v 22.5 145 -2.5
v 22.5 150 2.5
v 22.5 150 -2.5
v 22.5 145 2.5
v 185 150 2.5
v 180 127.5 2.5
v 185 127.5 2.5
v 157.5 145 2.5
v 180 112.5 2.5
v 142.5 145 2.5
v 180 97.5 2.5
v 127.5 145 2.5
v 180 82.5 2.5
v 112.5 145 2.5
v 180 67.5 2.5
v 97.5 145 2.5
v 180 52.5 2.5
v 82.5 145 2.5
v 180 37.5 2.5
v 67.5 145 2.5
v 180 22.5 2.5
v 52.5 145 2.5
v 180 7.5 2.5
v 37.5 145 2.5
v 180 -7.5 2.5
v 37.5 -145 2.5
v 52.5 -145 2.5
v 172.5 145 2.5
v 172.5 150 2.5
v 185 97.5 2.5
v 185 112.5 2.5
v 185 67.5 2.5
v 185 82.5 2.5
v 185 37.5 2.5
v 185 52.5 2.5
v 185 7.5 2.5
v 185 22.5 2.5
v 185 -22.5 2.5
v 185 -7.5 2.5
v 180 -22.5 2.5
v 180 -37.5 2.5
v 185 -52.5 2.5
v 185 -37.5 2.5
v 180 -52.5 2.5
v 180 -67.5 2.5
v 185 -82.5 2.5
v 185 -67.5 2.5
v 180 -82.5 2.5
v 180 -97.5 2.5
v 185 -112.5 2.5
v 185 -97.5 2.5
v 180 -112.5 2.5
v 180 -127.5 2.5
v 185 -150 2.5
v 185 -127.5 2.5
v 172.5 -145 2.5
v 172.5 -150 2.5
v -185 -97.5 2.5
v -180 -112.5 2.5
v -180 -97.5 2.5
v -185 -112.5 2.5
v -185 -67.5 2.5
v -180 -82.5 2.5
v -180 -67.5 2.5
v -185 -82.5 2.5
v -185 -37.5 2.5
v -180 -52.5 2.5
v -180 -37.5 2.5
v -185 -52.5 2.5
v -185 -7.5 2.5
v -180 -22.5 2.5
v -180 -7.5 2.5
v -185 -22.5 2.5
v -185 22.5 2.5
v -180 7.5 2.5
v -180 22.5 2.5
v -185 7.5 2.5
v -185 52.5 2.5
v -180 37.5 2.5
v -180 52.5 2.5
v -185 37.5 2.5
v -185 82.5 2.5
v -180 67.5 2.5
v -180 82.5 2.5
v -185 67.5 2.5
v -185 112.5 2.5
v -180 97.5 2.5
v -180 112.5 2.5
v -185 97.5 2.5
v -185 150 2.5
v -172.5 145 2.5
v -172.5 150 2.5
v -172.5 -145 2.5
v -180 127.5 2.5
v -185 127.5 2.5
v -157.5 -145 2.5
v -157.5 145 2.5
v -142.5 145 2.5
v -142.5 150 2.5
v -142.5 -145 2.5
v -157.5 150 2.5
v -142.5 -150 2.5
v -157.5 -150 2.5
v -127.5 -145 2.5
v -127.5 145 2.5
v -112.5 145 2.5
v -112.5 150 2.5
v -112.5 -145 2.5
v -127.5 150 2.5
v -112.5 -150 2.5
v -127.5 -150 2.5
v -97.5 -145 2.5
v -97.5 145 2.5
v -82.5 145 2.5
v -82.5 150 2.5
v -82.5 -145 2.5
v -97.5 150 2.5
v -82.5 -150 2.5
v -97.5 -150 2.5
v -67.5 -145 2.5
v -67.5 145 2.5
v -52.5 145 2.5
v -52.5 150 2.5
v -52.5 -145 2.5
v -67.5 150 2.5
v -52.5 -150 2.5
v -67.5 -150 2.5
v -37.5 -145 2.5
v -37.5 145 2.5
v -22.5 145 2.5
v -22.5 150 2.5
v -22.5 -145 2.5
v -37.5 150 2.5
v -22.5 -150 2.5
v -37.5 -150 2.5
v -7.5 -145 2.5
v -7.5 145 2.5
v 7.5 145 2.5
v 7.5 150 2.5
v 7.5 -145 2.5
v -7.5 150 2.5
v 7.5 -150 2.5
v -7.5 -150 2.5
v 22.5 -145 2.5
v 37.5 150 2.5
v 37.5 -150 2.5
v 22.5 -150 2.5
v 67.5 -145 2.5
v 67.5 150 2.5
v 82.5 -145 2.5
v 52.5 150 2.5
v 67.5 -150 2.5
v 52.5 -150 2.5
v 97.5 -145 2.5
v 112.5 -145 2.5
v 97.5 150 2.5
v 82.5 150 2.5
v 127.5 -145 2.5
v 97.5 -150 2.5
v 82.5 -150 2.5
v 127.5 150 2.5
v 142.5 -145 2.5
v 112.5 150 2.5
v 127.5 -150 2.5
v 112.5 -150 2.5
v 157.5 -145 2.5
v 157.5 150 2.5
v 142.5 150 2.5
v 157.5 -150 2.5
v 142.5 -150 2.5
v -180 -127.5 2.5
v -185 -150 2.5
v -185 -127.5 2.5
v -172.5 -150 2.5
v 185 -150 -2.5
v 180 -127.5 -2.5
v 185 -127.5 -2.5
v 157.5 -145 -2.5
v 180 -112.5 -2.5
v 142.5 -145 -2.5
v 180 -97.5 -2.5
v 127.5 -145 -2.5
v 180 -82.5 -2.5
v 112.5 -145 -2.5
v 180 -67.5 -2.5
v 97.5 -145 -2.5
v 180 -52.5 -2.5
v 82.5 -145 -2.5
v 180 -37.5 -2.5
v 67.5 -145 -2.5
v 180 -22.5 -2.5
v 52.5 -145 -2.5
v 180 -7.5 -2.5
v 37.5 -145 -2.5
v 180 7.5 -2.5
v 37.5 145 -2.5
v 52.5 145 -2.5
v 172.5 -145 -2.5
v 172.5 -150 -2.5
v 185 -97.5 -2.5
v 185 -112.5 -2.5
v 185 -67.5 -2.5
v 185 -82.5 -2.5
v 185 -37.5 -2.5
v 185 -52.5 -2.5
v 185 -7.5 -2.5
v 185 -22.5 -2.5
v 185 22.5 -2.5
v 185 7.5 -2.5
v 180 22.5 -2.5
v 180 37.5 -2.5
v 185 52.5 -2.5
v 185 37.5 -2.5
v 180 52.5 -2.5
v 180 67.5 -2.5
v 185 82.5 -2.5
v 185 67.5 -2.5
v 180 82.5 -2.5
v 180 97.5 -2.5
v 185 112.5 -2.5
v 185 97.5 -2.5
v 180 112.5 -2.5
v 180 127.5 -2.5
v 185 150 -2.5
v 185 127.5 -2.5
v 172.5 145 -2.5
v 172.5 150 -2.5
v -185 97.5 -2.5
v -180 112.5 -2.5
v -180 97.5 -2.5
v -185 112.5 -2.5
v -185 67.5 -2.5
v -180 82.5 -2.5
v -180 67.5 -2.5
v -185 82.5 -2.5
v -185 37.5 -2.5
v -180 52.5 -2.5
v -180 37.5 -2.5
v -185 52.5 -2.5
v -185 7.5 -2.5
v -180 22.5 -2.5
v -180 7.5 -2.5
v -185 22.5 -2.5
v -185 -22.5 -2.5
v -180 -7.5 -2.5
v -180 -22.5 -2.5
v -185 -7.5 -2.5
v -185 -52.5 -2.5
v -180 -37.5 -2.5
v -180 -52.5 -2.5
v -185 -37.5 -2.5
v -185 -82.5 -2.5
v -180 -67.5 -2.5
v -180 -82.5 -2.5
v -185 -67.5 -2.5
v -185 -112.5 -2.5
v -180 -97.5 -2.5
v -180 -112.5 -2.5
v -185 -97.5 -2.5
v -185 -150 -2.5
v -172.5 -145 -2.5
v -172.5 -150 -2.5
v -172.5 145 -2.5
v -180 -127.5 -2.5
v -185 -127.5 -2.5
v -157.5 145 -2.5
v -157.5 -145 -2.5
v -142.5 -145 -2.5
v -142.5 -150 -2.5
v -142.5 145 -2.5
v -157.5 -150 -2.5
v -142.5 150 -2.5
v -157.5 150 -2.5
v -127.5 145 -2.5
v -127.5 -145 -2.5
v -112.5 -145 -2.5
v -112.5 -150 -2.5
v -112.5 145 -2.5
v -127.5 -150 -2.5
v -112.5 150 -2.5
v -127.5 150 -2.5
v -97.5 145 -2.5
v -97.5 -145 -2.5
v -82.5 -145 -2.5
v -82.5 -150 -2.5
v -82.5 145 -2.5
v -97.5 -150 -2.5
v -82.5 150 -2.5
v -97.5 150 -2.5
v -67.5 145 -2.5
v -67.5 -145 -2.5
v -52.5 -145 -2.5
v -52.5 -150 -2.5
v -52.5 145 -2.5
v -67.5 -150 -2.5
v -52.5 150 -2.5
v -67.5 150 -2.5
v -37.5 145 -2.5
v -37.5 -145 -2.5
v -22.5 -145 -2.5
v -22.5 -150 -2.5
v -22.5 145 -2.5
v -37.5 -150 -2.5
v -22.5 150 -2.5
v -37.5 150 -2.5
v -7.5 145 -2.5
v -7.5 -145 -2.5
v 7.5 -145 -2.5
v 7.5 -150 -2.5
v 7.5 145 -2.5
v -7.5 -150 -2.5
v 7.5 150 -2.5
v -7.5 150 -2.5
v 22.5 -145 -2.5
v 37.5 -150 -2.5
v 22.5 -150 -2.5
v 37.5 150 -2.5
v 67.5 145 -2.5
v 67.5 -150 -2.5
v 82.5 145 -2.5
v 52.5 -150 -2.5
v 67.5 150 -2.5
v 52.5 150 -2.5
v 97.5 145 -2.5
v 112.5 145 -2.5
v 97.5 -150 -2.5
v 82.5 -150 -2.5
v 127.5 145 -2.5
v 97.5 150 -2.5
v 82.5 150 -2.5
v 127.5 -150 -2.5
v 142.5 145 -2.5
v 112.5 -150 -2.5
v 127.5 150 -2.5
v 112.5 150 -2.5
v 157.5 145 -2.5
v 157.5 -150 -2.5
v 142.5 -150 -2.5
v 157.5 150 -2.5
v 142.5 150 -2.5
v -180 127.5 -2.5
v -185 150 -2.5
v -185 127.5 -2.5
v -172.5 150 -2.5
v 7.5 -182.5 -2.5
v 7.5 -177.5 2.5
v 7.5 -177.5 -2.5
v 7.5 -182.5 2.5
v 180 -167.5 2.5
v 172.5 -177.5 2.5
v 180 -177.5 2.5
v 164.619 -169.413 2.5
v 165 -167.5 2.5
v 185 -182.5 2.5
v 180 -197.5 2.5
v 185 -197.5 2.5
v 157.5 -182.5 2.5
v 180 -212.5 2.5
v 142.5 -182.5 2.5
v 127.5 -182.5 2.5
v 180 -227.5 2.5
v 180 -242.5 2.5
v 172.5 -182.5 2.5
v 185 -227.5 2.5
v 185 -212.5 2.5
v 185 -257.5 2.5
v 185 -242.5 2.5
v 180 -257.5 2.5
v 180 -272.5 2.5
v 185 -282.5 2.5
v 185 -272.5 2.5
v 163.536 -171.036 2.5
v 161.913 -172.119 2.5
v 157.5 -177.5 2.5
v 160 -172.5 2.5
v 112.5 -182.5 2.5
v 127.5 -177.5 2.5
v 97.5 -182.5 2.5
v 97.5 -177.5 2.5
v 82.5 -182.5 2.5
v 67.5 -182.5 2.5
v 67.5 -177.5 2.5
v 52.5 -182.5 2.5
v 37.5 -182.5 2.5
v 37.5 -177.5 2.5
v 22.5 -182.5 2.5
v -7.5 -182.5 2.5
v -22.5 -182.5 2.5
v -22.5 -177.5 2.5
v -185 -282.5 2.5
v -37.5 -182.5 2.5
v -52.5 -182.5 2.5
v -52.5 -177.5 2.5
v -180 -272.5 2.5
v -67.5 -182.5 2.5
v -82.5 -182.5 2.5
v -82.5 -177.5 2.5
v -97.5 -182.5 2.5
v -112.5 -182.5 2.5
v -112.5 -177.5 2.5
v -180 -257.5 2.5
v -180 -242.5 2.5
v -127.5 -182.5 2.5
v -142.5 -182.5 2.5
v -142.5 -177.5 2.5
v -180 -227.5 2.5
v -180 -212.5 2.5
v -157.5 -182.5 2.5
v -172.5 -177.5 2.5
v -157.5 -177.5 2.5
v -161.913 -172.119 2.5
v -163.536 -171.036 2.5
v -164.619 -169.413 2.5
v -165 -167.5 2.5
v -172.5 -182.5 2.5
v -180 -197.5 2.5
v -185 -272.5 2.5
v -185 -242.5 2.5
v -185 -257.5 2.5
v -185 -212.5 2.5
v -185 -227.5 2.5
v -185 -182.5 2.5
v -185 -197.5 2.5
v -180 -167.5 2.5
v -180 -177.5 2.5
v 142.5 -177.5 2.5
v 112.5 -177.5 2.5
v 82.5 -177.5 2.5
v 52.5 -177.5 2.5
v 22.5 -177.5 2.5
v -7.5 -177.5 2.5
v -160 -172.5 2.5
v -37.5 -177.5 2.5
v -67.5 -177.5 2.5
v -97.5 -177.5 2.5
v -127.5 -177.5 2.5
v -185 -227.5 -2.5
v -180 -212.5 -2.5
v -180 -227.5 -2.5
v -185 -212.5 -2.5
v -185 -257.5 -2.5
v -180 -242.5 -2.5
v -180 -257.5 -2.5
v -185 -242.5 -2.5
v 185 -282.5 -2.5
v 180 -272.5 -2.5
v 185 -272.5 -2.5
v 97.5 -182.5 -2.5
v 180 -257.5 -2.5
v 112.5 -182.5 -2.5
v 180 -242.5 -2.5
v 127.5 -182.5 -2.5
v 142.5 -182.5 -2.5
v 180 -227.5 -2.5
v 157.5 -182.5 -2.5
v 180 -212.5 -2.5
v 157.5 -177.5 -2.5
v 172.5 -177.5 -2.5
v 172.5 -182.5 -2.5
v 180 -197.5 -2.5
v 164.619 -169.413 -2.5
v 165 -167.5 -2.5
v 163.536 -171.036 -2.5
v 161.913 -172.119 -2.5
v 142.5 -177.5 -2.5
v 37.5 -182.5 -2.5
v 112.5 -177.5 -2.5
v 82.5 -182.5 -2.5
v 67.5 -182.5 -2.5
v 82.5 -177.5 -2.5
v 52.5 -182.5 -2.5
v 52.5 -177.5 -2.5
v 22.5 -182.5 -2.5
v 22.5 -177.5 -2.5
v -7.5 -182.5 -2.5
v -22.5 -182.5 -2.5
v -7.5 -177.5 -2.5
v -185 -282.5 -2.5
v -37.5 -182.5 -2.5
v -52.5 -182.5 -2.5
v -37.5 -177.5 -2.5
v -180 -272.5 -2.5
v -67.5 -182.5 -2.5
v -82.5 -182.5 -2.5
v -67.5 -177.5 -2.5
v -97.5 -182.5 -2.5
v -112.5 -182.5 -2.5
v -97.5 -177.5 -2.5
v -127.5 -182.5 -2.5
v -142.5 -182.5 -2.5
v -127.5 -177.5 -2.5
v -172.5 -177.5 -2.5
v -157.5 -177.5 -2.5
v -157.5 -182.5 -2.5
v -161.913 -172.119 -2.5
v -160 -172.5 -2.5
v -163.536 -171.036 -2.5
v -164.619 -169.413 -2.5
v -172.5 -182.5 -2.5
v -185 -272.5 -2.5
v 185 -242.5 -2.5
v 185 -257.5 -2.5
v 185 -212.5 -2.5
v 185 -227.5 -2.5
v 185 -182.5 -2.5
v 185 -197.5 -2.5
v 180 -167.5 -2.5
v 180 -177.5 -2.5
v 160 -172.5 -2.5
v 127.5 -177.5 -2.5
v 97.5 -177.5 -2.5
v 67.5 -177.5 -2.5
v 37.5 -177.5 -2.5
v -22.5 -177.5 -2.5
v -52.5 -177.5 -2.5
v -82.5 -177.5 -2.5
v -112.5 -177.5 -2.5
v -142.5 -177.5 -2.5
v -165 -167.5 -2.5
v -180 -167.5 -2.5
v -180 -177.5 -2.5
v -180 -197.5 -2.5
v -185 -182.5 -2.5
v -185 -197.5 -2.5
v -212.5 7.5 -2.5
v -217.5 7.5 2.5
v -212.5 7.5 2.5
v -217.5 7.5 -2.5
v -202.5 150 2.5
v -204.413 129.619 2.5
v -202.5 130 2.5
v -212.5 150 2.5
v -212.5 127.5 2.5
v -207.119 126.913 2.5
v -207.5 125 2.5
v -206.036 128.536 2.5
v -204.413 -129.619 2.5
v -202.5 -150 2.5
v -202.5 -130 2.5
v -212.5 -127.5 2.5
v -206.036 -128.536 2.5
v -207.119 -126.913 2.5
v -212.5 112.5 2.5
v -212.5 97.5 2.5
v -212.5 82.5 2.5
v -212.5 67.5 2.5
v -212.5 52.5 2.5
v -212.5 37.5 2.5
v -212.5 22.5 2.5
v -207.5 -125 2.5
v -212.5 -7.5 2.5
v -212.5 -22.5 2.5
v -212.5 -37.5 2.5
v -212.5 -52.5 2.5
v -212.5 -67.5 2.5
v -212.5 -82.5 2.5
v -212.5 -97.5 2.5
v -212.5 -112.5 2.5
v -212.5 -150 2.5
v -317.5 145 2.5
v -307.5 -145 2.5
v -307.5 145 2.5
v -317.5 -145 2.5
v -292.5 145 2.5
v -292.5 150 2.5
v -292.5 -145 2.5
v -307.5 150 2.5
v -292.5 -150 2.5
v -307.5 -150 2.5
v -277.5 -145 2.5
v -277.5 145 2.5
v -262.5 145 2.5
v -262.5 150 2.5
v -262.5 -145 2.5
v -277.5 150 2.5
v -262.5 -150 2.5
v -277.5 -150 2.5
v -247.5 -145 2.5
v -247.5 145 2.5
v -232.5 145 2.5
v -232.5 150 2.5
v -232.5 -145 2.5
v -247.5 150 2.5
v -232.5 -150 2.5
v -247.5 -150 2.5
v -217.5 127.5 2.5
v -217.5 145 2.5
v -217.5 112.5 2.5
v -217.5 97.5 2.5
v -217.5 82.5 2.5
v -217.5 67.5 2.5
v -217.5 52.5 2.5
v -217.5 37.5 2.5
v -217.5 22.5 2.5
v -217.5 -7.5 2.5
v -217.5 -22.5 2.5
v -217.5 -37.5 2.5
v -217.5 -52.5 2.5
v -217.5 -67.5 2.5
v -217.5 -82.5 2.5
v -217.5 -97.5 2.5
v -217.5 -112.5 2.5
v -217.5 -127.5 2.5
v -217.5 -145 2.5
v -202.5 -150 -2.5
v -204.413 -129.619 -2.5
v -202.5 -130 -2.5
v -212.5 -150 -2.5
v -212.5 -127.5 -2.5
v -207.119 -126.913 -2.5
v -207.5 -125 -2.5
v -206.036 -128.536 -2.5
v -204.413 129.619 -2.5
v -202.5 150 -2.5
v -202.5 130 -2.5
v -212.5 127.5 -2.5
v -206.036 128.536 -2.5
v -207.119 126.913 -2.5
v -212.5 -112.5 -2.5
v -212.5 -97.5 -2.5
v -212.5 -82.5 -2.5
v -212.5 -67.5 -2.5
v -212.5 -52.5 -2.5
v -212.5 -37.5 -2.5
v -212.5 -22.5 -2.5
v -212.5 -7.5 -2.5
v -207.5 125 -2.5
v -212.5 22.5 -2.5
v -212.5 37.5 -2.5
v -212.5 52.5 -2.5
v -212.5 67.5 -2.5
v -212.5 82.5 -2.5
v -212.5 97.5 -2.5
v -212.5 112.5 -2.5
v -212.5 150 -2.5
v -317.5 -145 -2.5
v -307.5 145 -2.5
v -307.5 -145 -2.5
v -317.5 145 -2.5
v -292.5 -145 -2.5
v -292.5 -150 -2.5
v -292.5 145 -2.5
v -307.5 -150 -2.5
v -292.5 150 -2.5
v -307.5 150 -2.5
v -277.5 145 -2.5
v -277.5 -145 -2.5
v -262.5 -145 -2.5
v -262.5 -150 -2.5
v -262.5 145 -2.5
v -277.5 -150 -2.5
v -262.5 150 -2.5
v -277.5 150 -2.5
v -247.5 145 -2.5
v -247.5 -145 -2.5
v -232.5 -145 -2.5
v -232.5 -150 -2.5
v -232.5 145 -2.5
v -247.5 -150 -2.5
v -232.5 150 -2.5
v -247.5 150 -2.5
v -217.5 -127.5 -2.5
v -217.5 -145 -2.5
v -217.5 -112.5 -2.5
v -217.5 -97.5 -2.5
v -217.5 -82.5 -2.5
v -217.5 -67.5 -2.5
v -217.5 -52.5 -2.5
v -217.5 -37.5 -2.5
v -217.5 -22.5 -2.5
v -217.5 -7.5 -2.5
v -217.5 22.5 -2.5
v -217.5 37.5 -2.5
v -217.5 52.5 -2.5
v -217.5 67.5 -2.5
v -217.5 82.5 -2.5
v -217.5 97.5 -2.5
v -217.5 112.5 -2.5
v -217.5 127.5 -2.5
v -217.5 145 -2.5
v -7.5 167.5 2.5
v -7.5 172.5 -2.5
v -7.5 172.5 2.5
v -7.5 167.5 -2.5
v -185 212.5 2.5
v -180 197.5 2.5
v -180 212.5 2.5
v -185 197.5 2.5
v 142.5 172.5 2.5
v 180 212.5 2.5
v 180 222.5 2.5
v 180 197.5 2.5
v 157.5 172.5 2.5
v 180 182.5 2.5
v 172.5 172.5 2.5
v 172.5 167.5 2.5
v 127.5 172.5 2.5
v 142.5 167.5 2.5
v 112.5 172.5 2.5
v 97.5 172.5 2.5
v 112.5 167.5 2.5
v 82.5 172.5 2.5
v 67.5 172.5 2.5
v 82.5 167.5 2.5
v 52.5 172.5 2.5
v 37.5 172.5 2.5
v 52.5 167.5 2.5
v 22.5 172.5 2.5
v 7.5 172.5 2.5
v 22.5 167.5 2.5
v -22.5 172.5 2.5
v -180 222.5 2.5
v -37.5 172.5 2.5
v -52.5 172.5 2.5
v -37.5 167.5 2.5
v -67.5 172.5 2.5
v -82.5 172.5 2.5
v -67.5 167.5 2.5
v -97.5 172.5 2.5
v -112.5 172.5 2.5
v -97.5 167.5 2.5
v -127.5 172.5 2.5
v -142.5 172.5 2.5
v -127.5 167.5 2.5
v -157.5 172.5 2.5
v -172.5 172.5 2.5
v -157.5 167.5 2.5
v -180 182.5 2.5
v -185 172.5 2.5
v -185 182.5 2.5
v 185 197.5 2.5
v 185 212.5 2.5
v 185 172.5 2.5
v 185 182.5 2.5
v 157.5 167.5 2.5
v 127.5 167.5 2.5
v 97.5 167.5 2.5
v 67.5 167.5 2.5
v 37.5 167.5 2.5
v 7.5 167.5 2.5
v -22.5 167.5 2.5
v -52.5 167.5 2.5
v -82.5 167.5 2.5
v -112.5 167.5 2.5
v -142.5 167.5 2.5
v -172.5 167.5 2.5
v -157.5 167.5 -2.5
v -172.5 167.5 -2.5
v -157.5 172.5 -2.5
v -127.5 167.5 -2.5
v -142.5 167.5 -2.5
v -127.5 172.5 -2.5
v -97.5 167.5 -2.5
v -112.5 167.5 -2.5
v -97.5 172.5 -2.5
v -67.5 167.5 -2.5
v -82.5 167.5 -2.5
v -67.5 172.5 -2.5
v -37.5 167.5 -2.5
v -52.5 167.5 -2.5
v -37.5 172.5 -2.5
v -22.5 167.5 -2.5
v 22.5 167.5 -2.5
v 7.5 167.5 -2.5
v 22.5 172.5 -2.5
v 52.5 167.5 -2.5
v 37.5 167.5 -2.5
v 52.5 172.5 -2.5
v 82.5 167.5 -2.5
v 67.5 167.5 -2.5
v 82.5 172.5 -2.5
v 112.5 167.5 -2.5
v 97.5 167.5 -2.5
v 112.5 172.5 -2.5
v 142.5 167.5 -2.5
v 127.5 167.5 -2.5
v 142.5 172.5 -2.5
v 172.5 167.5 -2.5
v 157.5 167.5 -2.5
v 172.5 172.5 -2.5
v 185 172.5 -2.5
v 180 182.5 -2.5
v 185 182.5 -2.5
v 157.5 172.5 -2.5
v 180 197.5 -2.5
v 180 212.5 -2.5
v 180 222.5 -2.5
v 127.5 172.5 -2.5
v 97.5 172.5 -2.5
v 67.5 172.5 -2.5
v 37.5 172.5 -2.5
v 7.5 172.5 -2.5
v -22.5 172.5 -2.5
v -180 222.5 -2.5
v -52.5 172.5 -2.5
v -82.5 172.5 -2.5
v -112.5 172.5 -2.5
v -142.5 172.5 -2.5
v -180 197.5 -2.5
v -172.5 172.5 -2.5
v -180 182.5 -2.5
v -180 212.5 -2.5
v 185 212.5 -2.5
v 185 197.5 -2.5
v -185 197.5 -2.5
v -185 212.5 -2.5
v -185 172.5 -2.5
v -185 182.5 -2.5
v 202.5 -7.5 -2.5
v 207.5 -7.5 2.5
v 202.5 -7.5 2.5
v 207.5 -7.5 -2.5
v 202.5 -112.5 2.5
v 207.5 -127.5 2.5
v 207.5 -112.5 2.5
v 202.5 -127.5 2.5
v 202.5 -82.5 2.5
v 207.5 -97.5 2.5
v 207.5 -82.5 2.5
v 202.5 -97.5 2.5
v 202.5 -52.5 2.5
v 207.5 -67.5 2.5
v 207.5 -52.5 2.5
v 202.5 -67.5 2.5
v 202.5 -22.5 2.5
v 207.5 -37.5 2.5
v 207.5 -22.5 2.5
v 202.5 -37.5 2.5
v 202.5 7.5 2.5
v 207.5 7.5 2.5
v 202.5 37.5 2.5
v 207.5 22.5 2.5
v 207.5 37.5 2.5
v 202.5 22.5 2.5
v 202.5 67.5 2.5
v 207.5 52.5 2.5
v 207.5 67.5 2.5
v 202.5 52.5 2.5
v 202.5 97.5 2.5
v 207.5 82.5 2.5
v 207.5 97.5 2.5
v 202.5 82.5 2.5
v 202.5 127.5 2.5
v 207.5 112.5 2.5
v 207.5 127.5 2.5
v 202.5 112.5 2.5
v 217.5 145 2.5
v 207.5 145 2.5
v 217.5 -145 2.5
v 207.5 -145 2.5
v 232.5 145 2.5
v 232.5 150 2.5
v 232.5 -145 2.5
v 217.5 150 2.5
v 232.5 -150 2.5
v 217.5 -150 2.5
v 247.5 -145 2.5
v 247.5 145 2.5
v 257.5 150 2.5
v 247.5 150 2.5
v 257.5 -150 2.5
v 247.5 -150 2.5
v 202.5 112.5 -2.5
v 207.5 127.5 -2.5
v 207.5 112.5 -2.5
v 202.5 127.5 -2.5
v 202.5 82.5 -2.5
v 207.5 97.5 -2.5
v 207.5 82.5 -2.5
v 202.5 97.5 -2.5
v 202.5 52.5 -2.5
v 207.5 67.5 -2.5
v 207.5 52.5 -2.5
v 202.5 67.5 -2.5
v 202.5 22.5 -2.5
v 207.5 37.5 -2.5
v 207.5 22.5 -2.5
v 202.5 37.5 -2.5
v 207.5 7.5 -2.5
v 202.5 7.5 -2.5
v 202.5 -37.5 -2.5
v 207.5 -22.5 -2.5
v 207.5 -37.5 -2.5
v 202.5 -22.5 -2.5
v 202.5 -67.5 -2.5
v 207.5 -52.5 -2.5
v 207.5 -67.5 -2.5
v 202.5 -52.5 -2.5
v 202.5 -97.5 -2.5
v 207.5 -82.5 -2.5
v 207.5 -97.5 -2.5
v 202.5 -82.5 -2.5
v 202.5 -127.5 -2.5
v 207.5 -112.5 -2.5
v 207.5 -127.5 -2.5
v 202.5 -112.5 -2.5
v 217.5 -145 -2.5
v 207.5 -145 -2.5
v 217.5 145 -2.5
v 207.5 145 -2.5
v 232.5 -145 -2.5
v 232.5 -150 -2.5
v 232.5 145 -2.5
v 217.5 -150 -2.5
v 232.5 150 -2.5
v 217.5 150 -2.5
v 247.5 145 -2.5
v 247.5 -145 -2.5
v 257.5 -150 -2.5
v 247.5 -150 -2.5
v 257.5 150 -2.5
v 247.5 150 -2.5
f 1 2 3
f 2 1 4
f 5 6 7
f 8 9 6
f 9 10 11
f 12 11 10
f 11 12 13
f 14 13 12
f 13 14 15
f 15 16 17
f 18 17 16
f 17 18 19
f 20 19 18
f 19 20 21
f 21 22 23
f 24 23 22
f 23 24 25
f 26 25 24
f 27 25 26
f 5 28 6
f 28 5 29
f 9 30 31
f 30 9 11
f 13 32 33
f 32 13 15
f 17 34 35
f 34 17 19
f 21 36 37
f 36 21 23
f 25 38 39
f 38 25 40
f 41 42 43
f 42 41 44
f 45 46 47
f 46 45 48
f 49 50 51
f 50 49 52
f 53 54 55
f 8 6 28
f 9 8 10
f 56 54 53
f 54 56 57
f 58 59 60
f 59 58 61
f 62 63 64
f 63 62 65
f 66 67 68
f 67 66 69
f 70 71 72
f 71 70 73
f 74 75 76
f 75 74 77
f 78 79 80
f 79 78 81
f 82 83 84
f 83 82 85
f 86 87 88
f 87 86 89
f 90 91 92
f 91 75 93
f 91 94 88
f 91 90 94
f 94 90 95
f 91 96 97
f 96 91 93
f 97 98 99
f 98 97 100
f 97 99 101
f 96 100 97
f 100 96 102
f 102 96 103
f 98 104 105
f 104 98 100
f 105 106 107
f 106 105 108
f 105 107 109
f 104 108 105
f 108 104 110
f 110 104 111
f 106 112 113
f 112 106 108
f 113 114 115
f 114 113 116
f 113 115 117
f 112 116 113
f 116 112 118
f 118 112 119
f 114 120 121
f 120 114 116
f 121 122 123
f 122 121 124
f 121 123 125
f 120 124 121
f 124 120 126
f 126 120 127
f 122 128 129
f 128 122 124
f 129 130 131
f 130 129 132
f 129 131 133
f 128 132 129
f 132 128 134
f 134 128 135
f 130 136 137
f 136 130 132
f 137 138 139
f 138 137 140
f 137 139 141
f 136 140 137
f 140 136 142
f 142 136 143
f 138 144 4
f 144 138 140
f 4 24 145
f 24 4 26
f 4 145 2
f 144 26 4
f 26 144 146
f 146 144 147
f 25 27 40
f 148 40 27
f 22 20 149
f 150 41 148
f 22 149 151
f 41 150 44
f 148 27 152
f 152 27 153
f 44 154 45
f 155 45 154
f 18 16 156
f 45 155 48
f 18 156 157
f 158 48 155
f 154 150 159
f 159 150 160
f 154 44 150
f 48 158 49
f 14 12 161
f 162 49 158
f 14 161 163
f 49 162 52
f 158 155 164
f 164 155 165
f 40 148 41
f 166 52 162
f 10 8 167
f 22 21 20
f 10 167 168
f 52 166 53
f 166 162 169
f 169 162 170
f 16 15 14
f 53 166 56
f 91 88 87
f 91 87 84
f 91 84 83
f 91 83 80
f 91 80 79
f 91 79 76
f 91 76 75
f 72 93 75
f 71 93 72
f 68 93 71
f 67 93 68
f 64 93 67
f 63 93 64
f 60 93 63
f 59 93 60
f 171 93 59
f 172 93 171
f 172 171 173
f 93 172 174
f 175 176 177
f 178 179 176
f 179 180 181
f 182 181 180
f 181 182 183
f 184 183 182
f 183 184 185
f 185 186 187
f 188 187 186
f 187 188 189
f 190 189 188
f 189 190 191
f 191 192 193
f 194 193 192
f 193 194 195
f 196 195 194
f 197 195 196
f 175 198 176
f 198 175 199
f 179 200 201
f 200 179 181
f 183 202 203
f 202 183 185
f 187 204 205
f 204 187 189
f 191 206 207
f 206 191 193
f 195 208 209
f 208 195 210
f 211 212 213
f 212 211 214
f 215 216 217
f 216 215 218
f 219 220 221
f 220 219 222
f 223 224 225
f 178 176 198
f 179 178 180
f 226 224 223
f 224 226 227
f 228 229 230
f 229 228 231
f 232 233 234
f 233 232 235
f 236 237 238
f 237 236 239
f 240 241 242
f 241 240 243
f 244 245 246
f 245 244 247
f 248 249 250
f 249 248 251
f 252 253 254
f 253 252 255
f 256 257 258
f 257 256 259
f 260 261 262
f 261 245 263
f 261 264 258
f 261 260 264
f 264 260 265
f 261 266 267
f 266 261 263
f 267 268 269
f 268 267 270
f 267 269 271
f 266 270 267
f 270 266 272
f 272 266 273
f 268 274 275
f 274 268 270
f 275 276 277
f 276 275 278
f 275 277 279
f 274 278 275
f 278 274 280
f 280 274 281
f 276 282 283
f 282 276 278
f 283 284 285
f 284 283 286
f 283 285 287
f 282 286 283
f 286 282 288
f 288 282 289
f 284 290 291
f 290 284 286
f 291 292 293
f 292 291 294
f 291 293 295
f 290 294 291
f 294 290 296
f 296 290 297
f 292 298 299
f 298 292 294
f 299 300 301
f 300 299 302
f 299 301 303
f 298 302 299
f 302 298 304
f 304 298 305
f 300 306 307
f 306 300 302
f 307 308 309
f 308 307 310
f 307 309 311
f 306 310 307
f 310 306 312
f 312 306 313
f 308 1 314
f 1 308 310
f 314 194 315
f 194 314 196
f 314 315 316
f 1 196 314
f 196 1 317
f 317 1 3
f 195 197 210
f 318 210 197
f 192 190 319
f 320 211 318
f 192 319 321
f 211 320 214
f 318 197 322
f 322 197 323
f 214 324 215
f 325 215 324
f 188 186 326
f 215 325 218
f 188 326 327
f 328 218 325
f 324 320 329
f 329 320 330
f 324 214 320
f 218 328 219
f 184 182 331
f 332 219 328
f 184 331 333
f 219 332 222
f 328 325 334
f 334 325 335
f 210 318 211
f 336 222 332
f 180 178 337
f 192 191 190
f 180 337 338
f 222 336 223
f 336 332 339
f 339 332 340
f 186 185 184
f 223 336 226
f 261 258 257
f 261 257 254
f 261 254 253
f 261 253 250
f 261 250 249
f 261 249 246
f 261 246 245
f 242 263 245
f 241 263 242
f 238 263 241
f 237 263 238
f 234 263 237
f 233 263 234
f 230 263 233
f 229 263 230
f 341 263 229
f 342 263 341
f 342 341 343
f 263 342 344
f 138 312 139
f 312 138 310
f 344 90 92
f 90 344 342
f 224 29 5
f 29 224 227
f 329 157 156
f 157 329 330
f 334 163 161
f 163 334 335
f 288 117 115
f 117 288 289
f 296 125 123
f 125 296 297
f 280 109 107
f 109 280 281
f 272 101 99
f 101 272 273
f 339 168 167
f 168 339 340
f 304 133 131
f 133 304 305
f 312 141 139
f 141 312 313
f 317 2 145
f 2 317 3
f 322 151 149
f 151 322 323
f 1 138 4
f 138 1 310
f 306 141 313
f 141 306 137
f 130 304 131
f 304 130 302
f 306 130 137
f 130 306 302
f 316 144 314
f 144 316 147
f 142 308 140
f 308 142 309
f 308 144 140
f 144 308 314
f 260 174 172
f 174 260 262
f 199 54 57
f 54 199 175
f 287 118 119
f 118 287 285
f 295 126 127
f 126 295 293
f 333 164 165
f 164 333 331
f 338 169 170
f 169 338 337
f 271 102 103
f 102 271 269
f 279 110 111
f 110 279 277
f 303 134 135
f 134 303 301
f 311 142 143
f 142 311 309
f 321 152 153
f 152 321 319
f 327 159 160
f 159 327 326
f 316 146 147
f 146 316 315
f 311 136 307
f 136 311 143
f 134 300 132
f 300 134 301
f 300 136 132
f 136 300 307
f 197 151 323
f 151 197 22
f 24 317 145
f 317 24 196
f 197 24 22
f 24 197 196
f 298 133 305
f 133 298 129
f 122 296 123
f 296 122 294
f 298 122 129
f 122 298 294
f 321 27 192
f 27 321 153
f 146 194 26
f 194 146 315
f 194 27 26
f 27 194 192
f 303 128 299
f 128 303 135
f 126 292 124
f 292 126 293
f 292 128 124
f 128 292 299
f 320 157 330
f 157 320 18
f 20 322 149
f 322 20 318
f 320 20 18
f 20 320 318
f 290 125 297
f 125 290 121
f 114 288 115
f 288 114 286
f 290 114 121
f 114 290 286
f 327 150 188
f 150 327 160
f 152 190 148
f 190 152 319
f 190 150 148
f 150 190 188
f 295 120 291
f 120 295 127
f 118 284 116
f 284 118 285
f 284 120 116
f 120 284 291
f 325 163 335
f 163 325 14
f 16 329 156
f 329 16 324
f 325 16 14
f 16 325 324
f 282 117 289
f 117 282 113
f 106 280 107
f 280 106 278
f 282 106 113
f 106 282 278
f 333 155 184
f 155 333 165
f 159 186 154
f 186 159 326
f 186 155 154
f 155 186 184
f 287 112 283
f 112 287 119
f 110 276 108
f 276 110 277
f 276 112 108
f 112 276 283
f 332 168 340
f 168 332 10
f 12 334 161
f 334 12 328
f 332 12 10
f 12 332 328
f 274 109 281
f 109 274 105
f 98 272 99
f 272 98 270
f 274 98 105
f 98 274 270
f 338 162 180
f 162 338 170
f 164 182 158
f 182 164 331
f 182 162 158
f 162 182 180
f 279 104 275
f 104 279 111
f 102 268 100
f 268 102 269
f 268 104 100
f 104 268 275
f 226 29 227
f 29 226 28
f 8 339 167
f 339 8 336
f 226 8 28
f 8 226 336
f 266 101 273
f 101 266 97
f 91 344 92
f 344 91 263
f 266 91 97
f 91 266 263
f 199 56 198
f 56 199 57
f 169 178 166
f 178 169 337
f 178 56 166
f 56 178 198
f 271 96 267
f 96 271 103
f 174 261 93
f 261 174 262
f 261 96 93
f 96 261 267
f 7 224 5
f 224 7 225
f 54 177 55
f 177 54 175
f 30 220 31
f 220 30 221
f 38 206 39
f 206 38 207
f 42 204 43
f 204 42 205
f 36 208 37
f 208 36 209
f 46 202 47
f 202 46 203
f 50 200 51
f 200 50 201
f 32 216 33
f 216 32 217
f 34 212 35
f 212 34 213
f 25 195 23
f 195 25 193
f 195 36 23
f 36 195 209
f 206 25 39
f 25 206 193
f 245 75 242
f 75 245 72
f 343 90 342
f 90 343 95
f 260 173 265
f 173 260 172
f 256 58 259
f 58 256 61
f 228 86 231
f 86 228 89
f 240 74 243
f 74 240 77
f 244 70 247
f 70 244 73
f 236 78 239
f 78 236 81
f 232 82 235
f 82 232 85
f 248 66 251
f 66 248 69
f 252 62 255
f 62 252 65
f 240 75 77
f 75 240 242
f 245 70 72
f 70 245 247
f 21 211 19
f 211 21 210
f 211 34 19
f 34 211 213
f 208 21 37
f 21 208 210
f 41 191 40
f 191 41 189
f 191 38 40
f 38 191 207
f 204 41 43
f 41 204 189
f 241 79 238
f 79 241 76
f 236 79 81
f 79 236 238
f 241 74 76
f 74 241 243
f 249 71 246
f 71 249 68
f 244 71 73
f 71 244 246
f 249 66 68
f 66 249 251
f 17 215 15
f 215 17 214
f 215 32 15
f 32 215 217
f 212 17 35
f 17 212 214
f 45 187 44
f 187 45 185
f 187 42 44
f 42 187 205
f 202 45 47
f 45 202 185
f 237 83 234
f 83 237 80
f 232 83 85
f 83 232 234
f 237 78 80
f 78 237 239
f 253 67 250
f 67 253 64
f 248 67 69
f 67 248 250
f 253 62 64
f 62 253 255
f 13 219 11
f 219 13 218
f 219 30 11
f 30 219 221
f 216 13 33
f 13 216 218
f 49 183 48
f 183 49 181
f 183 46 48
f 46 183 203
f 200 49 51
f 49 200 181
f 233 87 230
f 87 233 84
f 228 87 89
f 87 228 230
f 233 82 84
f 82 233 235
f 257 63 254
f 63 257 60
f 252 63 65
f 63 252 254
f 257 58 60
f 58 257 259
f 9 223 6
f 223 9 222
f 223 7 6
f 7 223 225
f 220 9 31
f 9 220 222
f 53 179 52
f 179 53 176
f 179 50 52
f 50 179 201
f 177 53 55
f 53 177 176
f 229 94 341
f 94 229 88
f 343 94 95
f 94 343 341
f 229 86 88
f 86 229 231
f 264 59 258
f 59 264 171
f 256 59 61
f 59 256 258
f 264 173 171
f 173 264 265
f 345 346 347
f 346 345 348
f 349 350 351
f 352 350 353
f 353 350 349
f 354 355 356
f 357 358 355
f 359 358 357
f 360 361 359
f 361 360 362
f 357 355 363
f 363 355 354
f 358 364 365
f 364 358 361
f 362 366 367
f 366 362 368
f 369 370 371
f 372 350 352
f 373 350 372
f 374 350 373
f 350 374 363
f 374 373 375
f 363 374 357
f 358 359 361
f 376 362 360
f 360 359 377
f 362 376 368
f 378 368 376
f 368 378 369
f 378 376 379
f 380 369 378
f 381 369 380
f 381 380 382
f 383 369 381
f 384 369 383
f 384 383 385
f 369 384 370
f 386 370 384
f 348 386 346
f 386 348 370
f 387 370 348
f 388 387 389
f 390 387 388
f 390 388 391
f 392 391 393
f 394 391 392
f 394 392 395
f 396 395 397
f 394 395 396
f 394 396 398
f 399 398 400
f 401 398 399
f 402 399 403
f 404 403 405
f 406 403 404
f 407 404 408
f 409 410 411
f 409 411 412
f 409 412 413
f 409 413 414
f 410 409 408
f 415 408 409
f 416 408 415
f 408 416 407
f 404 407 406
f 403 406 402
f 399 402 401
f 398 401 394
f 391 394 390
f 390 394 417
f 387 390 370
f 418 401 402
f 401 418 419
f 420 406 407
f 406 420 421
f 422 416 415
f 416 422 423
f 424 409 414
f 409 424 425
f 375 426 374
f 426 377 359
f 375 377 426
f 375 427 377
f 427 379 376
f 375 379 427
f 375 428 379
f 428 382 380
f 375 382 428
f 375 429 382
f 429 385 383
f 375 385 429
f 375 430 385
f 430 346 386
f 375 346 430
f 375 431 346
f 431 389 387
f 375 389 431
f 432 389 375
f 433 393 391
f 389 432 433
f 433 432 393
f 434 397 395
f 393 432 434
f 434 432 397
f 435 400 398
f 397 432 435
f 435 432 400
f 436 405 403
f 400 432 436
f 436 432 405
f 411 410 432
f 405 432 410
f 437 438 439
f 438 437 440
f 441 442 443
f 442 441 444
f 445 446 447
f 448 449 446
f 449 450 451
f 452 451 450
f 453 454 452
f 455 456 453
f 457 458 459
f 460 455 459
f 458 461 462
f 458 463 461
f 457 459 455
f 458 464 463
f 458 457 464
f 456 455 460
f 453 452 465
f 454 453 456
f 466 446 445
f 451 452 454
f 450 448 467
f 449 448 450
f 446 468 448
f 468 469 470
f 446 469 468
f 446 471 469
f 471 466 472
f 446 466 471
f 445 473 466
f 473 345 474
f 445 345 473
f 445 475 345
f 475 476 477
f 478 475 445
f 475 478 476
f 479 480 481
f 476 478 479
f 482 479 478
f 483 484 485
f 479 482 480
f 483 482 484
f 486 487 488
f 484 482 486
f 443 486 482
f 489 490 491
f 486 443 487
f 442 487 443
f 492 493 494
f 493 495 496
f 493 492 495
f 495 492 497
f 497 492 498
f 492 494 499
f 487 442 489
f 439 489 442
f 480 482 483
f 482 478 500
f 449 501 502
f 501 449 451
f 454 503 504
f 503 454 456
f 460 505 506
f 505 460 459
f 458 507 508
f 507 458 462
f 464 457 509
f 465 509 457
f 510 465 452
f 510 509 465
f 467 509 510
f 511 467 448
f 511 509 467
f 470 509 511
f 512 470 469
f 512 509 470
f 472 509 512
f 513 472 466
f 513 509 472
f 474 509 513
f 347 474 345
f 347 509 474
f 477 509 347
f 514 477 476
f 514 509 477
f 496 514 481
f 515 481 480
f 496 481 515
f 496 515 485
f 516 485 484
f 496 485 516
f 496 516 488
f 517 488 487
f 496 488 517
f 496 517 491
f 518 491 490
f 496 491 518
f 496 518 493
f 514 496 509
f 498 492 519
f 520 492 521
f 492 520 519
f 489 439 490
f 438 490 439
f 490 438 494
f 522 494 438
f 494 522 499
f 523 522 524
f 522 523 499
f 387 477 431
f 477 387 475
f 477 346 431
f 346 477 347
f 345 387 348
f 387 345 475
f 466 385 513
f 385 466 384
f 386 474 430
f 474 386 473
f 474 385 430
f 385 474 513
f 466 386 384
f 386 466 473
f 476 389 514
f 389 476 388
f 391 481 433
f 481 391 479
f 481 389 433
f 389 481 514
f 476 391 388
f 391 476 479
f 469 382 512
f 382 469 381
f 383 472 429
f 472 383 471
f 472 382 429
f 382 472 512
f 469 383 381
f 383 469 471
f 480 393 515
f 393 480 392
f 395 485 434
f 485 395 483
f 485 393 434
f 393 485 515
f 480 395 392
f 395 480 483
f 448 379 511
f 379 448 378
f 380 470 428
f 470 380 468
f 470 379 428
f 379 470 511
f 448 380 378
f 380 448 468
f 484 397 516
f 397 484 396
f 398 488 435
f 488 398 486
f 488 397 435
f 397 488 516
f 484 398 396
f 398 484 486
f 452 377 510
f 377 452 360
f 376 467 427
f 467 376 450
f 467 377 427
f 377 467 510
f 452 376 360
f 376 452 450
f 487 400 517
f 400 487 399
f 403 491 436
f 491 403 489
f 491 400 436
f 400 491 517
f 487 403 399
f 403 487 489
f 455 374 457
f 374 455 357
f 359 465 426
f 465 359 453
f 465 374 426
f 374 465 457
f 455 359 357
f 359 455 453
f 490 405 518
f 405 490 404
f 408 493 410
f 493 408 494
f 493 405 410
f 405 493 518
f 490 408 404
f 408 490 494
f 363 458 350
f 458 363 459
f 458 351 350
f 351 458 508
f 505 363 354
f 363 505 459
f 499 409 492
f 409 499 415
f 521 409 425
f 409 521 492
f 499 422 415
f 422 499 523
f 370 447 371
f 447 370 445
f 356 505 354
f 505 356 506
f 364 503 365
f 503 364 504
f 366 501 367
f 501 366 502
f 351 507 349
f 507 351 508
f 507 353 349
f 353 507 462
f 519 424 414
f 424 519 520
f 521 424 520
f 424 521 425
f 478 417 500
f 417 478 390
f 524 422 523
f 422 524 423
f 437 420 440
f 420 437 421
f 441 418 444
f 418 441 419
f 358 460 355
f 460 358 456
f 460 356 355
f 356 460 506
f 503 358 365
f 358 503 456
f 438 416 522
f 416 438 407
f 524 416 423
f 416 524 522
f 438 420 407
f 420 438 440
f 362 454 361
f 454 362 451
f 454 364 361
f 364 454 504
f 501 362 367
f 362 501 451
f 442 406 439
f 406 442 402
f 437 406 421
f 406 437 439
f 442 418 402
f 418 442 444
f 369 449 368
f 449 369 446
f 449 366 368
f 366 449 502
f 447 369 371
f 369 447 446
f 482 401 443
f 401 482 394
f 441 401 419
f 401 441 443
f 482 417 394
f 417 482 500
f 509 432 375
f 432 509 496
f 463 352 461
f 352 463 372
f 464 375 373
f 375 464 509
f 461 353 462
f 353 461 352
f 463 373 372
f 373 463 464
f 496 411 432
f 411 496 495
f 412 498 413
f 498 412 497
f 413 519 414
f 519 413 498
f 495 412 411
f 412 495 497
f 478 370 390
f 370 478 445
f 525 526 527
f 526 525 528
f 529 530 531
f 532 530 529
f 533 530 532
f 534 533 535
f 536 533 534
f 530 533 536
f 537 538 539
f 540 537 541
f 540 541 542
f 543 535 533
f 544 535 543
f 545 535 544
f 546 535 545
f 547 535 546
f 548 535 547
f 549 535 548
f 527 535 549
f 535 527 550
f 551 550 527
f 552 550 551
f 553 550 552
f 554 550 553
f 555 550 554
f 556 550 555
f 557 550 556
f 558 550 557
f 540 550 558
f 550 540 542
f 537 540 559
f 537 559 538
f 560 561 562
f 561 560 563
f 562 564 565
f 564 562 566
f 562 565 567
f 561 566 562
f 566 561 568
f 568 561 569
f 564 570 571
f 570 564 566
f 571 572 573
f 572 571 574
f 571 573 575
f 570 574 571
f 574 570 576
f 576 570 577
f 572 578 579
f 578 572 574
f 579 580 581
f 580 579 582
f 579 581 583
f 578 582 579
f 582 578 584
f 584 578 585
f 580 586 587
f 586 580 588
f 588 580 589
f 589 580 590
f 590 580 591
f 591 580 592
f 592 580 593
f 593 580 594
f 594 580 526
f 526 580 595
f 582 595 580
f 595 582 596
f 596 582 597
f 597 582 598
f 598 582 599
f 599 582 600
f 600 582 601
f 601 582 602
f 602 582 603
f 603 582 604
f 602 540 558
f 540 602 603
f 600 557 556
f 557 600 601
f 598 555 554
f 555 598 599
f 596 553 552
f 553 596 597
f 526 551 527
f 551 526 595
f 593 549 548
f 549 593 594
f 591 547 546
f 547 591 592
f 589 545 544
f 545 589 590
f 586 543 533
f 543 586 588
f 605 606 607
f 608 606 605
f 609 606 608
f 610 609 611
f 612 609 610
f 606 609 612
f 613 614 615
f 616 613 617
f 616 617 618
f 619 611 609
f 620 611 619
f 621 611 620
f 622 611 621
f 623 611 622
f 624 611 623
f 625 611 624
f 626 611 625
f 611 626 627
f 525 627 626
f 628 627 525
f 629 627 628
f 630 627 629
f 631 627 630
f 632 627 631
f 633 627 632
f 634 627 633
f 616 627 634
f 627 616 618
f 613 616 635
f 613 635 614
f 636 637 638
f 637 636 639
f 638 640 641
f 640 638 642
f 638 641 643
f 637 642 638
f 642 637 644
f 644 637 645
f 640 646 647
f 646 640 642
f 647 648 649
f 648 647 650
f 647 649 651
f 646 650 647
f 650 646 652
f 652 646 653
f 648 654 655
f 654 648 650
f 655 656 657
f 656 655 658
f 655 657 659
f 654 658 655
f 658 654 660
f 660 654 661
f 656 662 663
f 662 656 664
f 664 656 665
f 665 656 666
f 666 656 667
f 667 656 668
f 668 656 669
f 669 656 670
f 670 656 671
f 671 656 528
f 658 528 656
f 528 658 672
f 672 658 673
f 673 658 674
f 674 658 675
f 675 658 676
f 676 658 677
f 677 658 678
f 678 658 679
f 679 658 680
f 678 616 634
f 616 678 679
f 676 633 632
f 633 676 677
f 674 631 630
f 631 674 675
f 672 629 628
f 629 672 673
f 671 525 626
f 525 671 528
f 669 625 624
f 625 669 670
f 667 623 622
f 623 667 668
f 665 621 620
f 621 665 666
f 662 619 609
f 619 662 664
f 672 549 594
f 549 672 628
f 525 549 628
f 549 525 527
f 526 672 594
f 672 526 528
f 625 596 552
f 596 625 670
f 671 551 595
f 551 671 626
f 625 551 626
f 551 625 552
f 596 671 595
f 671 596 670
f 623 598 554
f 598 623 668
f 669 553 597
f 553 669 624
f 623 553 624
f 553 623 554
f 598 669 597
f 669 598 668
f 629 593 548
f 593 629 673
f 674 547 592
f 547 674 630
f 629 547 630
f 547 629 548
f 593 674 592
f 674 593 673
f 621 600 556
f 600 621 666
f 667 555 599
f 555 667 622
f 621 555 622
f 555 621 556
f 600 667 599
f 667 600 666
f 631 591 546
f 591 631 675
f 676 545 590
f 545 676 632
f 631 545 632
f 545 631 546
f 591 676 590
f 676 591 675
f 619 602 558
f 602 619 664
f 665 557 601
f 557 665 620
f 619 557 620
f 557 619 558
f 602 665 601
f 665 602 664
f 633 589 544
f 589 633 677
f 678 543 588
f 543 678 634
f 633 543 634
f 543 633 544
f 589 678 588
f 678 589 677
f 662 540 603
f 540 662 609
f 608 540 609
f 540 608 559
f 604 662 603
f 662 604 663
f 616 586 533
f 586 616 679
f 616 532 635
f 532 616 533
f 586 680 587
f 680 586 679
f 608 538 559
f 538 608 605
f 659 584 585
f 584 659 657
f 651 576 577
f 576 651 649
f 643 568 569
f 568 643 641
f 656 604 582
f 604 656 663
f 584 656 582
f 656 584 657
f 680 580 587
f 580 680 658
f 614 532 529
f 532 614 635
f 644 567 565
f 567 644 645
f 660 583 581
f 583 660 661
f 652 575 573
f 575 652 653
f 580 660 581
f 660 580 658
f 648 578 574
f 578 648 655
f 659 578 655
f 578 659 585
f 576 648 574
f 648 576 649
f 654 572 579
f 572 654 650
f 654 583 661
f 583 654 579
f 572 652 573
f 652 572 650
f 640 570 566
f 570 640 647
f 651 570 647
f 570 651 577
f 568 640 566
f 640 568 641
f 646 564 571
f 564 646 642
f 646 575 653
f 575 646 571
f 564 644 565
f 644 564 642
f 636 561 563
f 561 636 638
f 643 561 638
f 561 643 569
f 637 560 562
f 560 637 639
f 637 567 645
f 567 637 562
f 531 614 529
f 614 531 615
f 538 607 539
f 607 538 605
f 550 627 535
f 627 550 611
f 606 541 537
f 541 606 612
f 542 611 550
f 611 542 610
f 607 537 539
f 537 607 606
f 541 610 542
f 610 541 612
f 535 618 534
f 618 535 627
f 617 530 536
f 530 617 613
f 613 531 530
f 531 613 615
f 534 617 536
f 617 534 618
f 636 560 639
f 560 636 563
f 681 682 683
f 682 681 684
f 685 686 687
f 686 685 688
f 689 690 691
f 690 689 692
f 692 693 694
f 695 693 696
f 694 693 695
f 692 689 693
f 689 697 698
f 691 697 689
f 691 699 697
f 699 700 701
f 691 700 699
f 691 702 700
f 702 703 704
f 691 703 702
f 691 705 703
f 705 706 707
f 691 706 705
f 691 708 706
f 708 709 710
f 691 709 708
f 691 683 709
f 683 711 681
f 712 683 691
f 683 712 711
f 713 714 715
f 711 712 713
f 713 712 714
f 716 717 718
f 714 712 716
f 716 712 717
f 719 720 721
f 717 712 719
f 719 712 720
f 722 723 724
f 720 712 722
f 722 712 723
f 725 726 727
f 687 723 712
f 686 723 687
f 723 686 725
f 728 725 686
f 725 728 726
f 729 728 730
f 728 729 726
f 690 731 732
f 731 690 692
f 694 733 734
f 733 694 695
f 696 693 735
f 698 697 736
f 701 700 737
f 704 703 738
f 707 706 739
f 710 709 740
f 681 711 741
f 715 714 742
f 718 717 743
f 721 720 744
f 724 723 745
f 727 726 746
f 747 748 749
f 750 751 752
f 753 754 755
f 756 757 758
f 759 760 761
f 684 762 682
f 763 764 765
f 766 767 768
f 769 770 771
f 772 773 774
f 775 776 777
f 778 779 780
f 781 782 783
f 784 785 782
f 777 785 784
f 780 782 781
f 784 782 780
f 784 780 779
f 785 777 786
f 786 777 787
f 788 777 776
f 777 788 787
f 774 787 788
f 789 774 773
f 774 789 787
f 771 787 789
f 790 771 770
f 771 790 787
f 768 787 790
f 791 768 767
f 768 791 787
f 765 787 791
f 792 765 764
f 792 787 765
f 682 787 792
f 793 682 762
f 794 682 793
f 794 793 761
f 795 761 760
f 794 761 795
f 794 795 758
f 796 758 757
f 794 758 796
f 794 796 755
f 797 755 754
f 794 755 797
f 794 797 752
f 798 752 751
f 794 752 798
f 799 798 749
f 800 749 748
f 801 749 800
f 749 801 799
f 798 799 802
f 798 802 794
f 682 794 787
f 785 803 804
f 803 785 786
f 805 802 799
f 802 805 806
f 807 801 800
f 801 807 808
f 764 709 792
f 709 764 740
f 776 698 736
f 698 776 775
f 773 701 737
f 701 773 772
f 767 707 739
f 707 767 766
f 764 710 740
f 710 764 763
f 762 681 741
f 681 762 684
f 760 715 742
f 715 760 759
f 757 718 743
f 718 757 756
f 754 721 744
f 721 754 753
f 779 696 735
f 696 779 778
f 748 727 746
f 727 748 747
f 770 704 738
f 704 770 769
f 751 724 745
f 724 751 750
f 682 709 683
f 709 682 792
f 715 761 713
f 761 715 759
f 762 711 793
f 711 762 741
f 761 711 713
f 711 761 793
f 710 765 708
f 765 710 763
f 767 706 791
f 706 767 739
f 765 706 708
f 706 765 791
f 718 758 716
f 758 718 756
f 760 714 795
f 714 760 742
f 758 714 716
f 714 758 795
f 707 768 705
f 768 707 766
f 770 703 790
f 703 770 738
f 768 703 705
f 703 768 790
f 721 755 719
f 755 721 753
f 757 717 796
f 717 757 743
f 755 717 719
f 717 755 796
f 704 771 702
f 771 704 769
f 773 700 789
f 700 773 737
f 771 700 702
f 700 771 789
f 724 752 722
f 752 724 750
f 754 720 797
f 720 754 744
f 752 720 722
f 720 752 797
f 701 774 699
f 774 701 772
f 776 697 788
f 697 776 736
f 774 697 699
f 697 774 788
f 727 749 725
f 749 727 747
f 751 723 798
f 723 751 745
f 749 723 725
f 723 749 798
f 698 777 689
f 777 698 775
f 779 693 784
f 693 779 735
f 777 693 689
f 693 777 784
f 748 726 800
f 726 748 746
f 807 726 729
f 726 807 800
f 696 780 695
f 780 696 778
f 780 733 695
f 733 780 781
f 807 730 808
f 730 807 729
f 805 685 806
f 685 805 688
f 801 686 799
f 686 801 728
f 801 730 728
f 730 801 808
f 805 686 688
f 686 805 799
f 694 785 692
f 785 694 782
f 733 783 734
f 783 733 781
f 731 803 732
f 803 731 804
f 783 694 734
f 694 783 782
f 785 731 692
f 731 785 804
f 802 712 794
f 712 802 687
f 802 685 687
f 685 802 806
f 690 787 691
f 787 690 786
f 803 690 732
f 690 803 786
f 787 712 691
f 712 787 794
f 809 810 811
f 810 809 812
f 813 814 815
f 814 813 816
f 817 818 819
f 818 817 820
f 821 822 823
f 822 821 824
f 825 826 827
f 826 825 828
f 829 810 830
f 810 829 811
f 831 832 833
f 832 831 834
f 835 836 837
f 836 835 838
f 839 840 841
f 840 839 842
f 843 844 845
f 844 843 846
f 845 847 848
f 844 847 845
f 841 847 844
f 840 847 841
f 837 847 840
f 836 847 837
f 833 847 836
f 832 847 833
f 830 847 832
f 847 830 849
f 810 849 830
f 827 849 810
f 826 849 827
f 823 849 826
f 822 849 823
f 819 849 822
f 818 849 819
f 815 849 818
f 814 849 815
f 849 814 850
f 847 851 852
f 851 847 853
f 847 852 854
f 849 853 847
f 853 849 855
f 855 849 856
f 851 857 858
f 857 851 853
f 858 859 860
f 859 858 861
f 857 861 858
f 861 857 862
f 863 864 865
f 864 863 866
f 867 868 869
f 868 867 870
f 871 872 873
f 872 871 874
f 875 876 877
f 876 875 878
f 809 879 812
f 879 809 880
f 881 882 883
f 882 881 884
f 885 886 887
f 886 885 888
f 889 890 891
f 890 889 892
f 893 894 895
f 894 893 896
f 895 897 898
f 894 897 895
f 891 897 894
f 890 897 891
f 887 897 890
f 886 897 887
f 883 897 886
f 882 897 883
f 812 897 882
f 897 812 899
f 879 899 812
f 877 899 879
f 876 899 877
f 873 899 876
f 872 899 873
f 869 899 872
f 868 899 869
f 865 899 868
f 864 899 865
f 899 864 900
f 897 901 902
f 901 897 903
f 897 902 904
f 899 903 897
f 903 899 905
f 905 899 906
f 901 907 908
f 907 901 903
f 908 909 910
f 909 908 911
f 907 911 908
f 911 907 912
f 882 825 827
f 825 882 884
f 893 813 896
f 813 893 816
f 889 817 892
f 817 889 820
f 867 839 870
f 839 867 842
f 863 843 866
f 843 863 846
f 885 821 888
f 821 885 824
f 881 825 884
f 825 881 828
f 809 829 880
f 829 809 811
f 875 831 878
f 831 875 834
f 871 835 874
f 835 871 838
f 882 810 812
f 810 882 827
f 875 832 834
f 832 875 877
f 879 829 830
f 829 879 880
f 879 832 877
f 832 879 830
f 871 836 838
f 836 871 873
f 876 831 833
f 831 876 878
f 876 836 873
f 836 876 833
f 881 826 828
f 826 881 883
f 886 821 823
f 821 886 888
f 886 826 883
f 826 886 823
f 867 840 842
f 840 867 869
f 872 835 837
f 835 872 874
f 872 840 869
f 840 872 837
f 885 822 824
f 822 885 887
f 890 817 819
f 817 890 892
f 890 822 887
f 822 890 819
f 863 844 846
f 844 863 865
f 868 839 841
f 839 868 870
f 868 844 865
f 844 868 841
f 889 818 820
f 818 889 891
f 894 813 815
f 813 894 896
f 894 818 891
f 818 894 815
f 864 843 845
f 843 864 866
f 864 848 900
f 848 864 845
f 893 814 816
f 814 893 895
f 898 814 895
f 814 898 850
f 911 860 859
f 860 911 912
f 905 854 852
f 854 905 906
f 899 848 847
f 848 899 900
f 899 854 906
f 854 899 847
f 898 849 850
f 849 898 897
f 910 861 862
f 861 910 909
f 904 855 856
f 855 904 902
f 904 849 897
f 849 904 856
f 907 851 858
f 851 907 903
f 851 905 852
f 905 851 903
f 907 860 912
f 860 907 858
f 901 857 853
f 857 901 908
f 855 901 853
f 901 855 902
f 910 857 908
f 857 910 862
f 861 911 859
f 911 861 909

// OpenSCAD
//**********************************************************************************************
// Laurent Le Goff
// GNU GPL v3
// http://www.thingiverse.com/thing:1805411
// member of TyFab fablab  http://tyfab.fr   
//**********************************************************************************************
//        dimension volume interieur
//     
//            _________________            \ \
//        ^  /                /|  ^         \ \
//     P /  /                / |  |          \_\___________
//      v  /________________/  |  |         | \_____________
//        |                 |  |  |          \|_
//        |                 | /|  | H       |\|_|T
//        |_________________|/ |  |          \|_
//     ^  |                 |  |  v         |\|_|
//   H1|  |                 | /              \|_
//     v  |_________________|/                |_|
//     
//        <----------------->     
//                 L
/*[Internal volume (mm)]*/
//Height - Hauteur
H = 150;   // hauteur du volume interieur en mm
//Length - Profondeur
P = 290;   // Profondeur du volume interieur en mm
//Width - Largeur
L = 360;   // Largeur du volume interieur en mm
//Low height - Hauteur de la partie basse
H1= 100;   // hauteur interieur de la partie basse en mm
//Board thickness - Epaisseur de la planche
Ep= 5;     // Epaisseur de la planche en mm
//Lug size
T = 15;  // Taille du tenon en mm
//--------------------------------------------------------------
/*[Options]*/
//Crate or Box - Caisse ou Boite
Boite = 1;  // [0:Crate,1:Box] 
//Close or Open - Fermee ou Ouverte
Ouvert = 1; // [0:Close,1:Open] 
//Foot 
Pied = 1;   // [0:without,1:with] 
//Handle
Poignee = 0;// [0:without,1:with(1*Ep),2:with(2*Ep),3:with(3*Ep)] 
//3D model or board profile
Dxf = 1;    // [0:3D,1:STL,2:DXF(OpenScad only)] 
// 0 -> 3D Model   1 -> board profile STL   2 -> board profil DXF
//--------------------------------------------------------------

/*[Hiden]*/
H2= H-H1;  // hauteur interieur de la partie haute


Lcenter = ((L-T-2*Ep)%(T*4))>=(2*T) ? 1 : 0; 
Pcenter = ((P-T-2*Ep)%(T*4))>=(2*T) ? 1 : 0; 

module fond()
{
    difference() {
        cube([L+2*Ep,P+2*Ep,Ep],center=true);  
        for (i=[Lcenter*T:2*T:L/2-Ep])
        {
           translate([i,P/2+Ep/2,0]) cube([T,Ep,Ep],center=true);
           translate([-i,P/2+Ep/2,0]) cube([T,Ep,Ep],center=true);
           translate([i,-P/2-Ep/2,0]) cube([T,Ep,Ep],center=true);
           translate([-i,-P/2-Ep/2,0]) cube([T,Ep,Ep],center=true);
        }
        for (i=[Pcenter*T:2*T:P/2-Ep])
        {
           translate([L/2+Ep/2,i,0]) cube([Ep,T,Ep],center=true);
           translate([L/2+Ep/2,-i,0]) cube([Ep,T,Ep],center=true);
           translate([-L/2-Ep/2,i,0]) cube([Ep,T,Ep],center=true);
           translate([-L/2-Ep/2,-i,0]) cube([Ep,T,Ep],center=true);
        }
    }
}

module coteb1()
{
    difference() {
        cube([L+2*Ep,H1+Ep+2*Ep*Pied,Ep],center=true);  
        for (i=[Lcenter*T-T:2*T:L/2+Ep])
        {
           translate([i,(H1-2*Ep*Pied)/2,0]) cube([T,Ep,Ep],center=true);
           translate([-i,(H1-2*Ep*Pied)/2,0]) cube([T,Ep,Ep],center=true);
        }
        translate([L/2,(H1-2*Ep*Pied)/2,0]) cube([2*Ep,Ep,Ep],center=true);
        translate([-L/2,(H1-2*Ep*Pied)/2,0]) cube([2*Ep,Ep,Ep],center=true);
        for (i=[(H1+Ep+2*Ep*Pied)/2-T/2:-2*T:-(H1+Ep+2*Ep*Pied)/2-T])
        {
           translate([L/2+Ep/2,i,0]) cube([Ep,T,Ep],center=true);
           translate([-L/2-Ep/2,i,0]) cube([Ep,T,Ep],center=true);
        }
        if (Pied==1)
        {
            translate([0,H1/2+Ep,0]) cube([L-8*Ep,Ep,Ep],center=true);
            translate([L/2-4*Ep,H1/2+3*Ep/2,0]) cylinder(r=Ep,h=Ep,center=true);
            translate([-L/2+4*Ep,H1/2+3*Ep/2,0]) cylinder(r=Ep,h=Ep,center=true);
        }
    }
}

module coteb2()
{
    difference() {
        cube([P+2*Ep,H1+Ep+2*Ep*Pied,Ep],center=true);  
        for (i=[Pcenter*T-T:2*T:P/2+Ep])
        {
           translate([i,(H1-2*Ep*Pied)/2,0]) cube([T,Ep,Ep],center=true);
           translate([-i,(H1-2*Ep*Pied)/2,0]) cube([T,Ep,Ep],center=true);
        }
        translate([P/2,(H1-2*Ep*Pied)/2,0]) cube([2*Ep,Ep,Ep],center=true);
        translate([-P/2,(H1-2*Ep*Pied)/2,0]) cube([2*Ep,Ep,Ep],center=true);
        for (i=[(H1+Ep+2*Ep*Pied)/2-3*T/2:-2*T:-(H1+Ep+2*Ep*Pied)/2-T])
        {
           translate([P/2+Ep/2,i,0]) cube([Ep,T,Ep],center=true);
           translate([-P/2-Ep/2,i,0]) cube([Ep,T,Ep],center=true);
        }
        if (Pied==1)
        {
            translate([0,H1/2+Ep,0]) cube([P-8*Ep,Ep,Ep],center=true);
            translate([P/2-4*Ep,H1/2+3*Ep/2,0]) cylinder(r=Ep,h=Ep,center=true);
            translate([-P/2+4*Ep,H1/2+3*Ep/2,0]) cylinder(r=Ep,h=Ep,center=true);
        }
        if (Poignee!=0)
        {
            translate([0,-(H1+Ep+2*Ep*Pied)/2+Poignee*Ep+15,0]) cube([90,20,Ep],center=true);
            translate([45,-(H1+Ep+2*Ep*Pied)/2+Poignee*Ep+15,0]) cylinder(r=10,h=Ep,center=true);
            translate([-45,-(H1+Ep+2*Ep*Pied)/2+Poignee*Ep+15,0]) cylinder(r=10,h=Ep,center=true);
        }
    }
}

module coteh1()
{
    difference() {
        cube([L+2*Ep,H2+Ep,Ep],center=true);  
        for (i=[Lcenter*T-T:2*T:L/2+Ep])
        {
           translate([i,H2/2,0]) cube([T,Ep,Ep],center=true);
           translate([-i,H2/2,0]) cube([T,Ep,Ep],center=true);
        }
        translate([L/2,H2/2,0]) cube([2*Ep,Ep,Ep],center=true);
        translate([-L/2,H2/2,0]) cube([2*Ep,Ep,Ep],center=true);
        for (i=[(H2+Ep)/2-3*T/2:-2*T:-H2/2-T])
        {
           translate([L/2+Ep/2,i,0]) cube([Ep,T,Ep],center=true);
           translate([-L/2-Ep/2,i,0]) cube([Ep,T,Ep],center=true);
        }
    }
}

module coteh2()
{
    difference() {
        cube([P+2*Ep,H2+Ep,Ep],center=true);  
        for (i=[Pcenter*T-T:2*T:P/2+Ep])
        {
           translate([i,H2/2,0]) cube([T,Ep,Ep],center=true);
           translate([-i,H2/2,0]) cube([T,Ep,Ep],center=true);
        }
        translate([P/2,H2/2,0]) cube([2*Ep,Ep,Ep],center=true);
        translate([-P/2,H2/2,0]) cube([2*Ep,Ep,Ep],center=true);
        for (i=[(H2+Ep)/2-T/2:-2*T:-(H2+Ep)/2])
        {
           translate([P/2+Ep/2,i,0]) cube([Ep,T,Ep],center=true);
           translate([-P/2-Ep/2,i,0]) cube([Ep,T,Ep],center=true);
        }
    }
}

module export_dxf() 
{
    fond();
    translate([0,-P/2-H1/2-3*Ep-T,0]) coteb1();
    rotate([0,0,-90]) translate([0,-L/2-H1/2-3*Ep-T,0]) coteb2();
    if (Boite==1) 
    {
        rotate([0,0,180]) translate([0,-P/2-H2/2-2*Ep-T,0]) coteh1();
        rotate([0,0,90]) translate([0,-L/2-H2/2-2*Ep-T,0]) coteh2();
    }
    else
    {
        rotate([0,0,180]) translate([0,-P/2-H1/2-3*Ep-T,0]) coteb1();
        rotate([0,0,90]) translate([0,-L/2-H1/2-3*Ep-T,0]) coteb2();   
    }
}

module bas()
{
    color("Khaki") translate([0,0,-H1-Ep/2]) fond();
    color("DarkKhaki") translate([0,-P/2-Ep/2,-H1/2-Ep/2-Ep*Pied]) rotate([-90,0,0]) coteb1();
    color("DarkKhaki") translate([0,+P/2+Ep/2,-H1/2-Ep/2-Ep*Pied]) rotate([-90,0,0]) coteb1();
    color("SandyBrown") translate([-L/2-Ep/2,0,-H1/2-Ep/2-Ep*Pied]) rotate([-90,0,90]) coteb2();
    color("SandyBrown") translate([+L/2+Ep/2,0,-H1/2-Ep/2-Ep*Pied]) rotate([-90,0,90]) coteb2();
}

module haut()
{
    color("Khaki") translate([0,0,H2+Ep/2]) fond();
    color("BurlyWood") translate([0,-P/2-Ep/2,H2/2+Ep/2]) rotate([90,0,0]) coteh1();
    color("BurlyWood") translate([0,+P/2+Ep/2,H2/2+Ep/2]) rotate([90,0,0]) coteh1();
    color("SaddleBrown") translate([-L/2-Ep/2,0,H2/2+Ep/2]) rotate([90,0,90]) coteh2();
    color("SaddleBrown") translate([+L/2+Ep/2,0,H2/2+Ep/2]) rotate([90,0,90]) coteh2();
}


if (Dxf==0)
{
    bas();
    if (Boite==1)
        if (Ouvert==0) haut();
        else translate([0,P/2+Ep+1,0]) rotate([-100,0,0]) translate([0,-P/2-Ep-1,0]) haut();
}
if (Dxf==1) export_dxf();
if (Dxf==2) projection(cut = false) export_dxf();

